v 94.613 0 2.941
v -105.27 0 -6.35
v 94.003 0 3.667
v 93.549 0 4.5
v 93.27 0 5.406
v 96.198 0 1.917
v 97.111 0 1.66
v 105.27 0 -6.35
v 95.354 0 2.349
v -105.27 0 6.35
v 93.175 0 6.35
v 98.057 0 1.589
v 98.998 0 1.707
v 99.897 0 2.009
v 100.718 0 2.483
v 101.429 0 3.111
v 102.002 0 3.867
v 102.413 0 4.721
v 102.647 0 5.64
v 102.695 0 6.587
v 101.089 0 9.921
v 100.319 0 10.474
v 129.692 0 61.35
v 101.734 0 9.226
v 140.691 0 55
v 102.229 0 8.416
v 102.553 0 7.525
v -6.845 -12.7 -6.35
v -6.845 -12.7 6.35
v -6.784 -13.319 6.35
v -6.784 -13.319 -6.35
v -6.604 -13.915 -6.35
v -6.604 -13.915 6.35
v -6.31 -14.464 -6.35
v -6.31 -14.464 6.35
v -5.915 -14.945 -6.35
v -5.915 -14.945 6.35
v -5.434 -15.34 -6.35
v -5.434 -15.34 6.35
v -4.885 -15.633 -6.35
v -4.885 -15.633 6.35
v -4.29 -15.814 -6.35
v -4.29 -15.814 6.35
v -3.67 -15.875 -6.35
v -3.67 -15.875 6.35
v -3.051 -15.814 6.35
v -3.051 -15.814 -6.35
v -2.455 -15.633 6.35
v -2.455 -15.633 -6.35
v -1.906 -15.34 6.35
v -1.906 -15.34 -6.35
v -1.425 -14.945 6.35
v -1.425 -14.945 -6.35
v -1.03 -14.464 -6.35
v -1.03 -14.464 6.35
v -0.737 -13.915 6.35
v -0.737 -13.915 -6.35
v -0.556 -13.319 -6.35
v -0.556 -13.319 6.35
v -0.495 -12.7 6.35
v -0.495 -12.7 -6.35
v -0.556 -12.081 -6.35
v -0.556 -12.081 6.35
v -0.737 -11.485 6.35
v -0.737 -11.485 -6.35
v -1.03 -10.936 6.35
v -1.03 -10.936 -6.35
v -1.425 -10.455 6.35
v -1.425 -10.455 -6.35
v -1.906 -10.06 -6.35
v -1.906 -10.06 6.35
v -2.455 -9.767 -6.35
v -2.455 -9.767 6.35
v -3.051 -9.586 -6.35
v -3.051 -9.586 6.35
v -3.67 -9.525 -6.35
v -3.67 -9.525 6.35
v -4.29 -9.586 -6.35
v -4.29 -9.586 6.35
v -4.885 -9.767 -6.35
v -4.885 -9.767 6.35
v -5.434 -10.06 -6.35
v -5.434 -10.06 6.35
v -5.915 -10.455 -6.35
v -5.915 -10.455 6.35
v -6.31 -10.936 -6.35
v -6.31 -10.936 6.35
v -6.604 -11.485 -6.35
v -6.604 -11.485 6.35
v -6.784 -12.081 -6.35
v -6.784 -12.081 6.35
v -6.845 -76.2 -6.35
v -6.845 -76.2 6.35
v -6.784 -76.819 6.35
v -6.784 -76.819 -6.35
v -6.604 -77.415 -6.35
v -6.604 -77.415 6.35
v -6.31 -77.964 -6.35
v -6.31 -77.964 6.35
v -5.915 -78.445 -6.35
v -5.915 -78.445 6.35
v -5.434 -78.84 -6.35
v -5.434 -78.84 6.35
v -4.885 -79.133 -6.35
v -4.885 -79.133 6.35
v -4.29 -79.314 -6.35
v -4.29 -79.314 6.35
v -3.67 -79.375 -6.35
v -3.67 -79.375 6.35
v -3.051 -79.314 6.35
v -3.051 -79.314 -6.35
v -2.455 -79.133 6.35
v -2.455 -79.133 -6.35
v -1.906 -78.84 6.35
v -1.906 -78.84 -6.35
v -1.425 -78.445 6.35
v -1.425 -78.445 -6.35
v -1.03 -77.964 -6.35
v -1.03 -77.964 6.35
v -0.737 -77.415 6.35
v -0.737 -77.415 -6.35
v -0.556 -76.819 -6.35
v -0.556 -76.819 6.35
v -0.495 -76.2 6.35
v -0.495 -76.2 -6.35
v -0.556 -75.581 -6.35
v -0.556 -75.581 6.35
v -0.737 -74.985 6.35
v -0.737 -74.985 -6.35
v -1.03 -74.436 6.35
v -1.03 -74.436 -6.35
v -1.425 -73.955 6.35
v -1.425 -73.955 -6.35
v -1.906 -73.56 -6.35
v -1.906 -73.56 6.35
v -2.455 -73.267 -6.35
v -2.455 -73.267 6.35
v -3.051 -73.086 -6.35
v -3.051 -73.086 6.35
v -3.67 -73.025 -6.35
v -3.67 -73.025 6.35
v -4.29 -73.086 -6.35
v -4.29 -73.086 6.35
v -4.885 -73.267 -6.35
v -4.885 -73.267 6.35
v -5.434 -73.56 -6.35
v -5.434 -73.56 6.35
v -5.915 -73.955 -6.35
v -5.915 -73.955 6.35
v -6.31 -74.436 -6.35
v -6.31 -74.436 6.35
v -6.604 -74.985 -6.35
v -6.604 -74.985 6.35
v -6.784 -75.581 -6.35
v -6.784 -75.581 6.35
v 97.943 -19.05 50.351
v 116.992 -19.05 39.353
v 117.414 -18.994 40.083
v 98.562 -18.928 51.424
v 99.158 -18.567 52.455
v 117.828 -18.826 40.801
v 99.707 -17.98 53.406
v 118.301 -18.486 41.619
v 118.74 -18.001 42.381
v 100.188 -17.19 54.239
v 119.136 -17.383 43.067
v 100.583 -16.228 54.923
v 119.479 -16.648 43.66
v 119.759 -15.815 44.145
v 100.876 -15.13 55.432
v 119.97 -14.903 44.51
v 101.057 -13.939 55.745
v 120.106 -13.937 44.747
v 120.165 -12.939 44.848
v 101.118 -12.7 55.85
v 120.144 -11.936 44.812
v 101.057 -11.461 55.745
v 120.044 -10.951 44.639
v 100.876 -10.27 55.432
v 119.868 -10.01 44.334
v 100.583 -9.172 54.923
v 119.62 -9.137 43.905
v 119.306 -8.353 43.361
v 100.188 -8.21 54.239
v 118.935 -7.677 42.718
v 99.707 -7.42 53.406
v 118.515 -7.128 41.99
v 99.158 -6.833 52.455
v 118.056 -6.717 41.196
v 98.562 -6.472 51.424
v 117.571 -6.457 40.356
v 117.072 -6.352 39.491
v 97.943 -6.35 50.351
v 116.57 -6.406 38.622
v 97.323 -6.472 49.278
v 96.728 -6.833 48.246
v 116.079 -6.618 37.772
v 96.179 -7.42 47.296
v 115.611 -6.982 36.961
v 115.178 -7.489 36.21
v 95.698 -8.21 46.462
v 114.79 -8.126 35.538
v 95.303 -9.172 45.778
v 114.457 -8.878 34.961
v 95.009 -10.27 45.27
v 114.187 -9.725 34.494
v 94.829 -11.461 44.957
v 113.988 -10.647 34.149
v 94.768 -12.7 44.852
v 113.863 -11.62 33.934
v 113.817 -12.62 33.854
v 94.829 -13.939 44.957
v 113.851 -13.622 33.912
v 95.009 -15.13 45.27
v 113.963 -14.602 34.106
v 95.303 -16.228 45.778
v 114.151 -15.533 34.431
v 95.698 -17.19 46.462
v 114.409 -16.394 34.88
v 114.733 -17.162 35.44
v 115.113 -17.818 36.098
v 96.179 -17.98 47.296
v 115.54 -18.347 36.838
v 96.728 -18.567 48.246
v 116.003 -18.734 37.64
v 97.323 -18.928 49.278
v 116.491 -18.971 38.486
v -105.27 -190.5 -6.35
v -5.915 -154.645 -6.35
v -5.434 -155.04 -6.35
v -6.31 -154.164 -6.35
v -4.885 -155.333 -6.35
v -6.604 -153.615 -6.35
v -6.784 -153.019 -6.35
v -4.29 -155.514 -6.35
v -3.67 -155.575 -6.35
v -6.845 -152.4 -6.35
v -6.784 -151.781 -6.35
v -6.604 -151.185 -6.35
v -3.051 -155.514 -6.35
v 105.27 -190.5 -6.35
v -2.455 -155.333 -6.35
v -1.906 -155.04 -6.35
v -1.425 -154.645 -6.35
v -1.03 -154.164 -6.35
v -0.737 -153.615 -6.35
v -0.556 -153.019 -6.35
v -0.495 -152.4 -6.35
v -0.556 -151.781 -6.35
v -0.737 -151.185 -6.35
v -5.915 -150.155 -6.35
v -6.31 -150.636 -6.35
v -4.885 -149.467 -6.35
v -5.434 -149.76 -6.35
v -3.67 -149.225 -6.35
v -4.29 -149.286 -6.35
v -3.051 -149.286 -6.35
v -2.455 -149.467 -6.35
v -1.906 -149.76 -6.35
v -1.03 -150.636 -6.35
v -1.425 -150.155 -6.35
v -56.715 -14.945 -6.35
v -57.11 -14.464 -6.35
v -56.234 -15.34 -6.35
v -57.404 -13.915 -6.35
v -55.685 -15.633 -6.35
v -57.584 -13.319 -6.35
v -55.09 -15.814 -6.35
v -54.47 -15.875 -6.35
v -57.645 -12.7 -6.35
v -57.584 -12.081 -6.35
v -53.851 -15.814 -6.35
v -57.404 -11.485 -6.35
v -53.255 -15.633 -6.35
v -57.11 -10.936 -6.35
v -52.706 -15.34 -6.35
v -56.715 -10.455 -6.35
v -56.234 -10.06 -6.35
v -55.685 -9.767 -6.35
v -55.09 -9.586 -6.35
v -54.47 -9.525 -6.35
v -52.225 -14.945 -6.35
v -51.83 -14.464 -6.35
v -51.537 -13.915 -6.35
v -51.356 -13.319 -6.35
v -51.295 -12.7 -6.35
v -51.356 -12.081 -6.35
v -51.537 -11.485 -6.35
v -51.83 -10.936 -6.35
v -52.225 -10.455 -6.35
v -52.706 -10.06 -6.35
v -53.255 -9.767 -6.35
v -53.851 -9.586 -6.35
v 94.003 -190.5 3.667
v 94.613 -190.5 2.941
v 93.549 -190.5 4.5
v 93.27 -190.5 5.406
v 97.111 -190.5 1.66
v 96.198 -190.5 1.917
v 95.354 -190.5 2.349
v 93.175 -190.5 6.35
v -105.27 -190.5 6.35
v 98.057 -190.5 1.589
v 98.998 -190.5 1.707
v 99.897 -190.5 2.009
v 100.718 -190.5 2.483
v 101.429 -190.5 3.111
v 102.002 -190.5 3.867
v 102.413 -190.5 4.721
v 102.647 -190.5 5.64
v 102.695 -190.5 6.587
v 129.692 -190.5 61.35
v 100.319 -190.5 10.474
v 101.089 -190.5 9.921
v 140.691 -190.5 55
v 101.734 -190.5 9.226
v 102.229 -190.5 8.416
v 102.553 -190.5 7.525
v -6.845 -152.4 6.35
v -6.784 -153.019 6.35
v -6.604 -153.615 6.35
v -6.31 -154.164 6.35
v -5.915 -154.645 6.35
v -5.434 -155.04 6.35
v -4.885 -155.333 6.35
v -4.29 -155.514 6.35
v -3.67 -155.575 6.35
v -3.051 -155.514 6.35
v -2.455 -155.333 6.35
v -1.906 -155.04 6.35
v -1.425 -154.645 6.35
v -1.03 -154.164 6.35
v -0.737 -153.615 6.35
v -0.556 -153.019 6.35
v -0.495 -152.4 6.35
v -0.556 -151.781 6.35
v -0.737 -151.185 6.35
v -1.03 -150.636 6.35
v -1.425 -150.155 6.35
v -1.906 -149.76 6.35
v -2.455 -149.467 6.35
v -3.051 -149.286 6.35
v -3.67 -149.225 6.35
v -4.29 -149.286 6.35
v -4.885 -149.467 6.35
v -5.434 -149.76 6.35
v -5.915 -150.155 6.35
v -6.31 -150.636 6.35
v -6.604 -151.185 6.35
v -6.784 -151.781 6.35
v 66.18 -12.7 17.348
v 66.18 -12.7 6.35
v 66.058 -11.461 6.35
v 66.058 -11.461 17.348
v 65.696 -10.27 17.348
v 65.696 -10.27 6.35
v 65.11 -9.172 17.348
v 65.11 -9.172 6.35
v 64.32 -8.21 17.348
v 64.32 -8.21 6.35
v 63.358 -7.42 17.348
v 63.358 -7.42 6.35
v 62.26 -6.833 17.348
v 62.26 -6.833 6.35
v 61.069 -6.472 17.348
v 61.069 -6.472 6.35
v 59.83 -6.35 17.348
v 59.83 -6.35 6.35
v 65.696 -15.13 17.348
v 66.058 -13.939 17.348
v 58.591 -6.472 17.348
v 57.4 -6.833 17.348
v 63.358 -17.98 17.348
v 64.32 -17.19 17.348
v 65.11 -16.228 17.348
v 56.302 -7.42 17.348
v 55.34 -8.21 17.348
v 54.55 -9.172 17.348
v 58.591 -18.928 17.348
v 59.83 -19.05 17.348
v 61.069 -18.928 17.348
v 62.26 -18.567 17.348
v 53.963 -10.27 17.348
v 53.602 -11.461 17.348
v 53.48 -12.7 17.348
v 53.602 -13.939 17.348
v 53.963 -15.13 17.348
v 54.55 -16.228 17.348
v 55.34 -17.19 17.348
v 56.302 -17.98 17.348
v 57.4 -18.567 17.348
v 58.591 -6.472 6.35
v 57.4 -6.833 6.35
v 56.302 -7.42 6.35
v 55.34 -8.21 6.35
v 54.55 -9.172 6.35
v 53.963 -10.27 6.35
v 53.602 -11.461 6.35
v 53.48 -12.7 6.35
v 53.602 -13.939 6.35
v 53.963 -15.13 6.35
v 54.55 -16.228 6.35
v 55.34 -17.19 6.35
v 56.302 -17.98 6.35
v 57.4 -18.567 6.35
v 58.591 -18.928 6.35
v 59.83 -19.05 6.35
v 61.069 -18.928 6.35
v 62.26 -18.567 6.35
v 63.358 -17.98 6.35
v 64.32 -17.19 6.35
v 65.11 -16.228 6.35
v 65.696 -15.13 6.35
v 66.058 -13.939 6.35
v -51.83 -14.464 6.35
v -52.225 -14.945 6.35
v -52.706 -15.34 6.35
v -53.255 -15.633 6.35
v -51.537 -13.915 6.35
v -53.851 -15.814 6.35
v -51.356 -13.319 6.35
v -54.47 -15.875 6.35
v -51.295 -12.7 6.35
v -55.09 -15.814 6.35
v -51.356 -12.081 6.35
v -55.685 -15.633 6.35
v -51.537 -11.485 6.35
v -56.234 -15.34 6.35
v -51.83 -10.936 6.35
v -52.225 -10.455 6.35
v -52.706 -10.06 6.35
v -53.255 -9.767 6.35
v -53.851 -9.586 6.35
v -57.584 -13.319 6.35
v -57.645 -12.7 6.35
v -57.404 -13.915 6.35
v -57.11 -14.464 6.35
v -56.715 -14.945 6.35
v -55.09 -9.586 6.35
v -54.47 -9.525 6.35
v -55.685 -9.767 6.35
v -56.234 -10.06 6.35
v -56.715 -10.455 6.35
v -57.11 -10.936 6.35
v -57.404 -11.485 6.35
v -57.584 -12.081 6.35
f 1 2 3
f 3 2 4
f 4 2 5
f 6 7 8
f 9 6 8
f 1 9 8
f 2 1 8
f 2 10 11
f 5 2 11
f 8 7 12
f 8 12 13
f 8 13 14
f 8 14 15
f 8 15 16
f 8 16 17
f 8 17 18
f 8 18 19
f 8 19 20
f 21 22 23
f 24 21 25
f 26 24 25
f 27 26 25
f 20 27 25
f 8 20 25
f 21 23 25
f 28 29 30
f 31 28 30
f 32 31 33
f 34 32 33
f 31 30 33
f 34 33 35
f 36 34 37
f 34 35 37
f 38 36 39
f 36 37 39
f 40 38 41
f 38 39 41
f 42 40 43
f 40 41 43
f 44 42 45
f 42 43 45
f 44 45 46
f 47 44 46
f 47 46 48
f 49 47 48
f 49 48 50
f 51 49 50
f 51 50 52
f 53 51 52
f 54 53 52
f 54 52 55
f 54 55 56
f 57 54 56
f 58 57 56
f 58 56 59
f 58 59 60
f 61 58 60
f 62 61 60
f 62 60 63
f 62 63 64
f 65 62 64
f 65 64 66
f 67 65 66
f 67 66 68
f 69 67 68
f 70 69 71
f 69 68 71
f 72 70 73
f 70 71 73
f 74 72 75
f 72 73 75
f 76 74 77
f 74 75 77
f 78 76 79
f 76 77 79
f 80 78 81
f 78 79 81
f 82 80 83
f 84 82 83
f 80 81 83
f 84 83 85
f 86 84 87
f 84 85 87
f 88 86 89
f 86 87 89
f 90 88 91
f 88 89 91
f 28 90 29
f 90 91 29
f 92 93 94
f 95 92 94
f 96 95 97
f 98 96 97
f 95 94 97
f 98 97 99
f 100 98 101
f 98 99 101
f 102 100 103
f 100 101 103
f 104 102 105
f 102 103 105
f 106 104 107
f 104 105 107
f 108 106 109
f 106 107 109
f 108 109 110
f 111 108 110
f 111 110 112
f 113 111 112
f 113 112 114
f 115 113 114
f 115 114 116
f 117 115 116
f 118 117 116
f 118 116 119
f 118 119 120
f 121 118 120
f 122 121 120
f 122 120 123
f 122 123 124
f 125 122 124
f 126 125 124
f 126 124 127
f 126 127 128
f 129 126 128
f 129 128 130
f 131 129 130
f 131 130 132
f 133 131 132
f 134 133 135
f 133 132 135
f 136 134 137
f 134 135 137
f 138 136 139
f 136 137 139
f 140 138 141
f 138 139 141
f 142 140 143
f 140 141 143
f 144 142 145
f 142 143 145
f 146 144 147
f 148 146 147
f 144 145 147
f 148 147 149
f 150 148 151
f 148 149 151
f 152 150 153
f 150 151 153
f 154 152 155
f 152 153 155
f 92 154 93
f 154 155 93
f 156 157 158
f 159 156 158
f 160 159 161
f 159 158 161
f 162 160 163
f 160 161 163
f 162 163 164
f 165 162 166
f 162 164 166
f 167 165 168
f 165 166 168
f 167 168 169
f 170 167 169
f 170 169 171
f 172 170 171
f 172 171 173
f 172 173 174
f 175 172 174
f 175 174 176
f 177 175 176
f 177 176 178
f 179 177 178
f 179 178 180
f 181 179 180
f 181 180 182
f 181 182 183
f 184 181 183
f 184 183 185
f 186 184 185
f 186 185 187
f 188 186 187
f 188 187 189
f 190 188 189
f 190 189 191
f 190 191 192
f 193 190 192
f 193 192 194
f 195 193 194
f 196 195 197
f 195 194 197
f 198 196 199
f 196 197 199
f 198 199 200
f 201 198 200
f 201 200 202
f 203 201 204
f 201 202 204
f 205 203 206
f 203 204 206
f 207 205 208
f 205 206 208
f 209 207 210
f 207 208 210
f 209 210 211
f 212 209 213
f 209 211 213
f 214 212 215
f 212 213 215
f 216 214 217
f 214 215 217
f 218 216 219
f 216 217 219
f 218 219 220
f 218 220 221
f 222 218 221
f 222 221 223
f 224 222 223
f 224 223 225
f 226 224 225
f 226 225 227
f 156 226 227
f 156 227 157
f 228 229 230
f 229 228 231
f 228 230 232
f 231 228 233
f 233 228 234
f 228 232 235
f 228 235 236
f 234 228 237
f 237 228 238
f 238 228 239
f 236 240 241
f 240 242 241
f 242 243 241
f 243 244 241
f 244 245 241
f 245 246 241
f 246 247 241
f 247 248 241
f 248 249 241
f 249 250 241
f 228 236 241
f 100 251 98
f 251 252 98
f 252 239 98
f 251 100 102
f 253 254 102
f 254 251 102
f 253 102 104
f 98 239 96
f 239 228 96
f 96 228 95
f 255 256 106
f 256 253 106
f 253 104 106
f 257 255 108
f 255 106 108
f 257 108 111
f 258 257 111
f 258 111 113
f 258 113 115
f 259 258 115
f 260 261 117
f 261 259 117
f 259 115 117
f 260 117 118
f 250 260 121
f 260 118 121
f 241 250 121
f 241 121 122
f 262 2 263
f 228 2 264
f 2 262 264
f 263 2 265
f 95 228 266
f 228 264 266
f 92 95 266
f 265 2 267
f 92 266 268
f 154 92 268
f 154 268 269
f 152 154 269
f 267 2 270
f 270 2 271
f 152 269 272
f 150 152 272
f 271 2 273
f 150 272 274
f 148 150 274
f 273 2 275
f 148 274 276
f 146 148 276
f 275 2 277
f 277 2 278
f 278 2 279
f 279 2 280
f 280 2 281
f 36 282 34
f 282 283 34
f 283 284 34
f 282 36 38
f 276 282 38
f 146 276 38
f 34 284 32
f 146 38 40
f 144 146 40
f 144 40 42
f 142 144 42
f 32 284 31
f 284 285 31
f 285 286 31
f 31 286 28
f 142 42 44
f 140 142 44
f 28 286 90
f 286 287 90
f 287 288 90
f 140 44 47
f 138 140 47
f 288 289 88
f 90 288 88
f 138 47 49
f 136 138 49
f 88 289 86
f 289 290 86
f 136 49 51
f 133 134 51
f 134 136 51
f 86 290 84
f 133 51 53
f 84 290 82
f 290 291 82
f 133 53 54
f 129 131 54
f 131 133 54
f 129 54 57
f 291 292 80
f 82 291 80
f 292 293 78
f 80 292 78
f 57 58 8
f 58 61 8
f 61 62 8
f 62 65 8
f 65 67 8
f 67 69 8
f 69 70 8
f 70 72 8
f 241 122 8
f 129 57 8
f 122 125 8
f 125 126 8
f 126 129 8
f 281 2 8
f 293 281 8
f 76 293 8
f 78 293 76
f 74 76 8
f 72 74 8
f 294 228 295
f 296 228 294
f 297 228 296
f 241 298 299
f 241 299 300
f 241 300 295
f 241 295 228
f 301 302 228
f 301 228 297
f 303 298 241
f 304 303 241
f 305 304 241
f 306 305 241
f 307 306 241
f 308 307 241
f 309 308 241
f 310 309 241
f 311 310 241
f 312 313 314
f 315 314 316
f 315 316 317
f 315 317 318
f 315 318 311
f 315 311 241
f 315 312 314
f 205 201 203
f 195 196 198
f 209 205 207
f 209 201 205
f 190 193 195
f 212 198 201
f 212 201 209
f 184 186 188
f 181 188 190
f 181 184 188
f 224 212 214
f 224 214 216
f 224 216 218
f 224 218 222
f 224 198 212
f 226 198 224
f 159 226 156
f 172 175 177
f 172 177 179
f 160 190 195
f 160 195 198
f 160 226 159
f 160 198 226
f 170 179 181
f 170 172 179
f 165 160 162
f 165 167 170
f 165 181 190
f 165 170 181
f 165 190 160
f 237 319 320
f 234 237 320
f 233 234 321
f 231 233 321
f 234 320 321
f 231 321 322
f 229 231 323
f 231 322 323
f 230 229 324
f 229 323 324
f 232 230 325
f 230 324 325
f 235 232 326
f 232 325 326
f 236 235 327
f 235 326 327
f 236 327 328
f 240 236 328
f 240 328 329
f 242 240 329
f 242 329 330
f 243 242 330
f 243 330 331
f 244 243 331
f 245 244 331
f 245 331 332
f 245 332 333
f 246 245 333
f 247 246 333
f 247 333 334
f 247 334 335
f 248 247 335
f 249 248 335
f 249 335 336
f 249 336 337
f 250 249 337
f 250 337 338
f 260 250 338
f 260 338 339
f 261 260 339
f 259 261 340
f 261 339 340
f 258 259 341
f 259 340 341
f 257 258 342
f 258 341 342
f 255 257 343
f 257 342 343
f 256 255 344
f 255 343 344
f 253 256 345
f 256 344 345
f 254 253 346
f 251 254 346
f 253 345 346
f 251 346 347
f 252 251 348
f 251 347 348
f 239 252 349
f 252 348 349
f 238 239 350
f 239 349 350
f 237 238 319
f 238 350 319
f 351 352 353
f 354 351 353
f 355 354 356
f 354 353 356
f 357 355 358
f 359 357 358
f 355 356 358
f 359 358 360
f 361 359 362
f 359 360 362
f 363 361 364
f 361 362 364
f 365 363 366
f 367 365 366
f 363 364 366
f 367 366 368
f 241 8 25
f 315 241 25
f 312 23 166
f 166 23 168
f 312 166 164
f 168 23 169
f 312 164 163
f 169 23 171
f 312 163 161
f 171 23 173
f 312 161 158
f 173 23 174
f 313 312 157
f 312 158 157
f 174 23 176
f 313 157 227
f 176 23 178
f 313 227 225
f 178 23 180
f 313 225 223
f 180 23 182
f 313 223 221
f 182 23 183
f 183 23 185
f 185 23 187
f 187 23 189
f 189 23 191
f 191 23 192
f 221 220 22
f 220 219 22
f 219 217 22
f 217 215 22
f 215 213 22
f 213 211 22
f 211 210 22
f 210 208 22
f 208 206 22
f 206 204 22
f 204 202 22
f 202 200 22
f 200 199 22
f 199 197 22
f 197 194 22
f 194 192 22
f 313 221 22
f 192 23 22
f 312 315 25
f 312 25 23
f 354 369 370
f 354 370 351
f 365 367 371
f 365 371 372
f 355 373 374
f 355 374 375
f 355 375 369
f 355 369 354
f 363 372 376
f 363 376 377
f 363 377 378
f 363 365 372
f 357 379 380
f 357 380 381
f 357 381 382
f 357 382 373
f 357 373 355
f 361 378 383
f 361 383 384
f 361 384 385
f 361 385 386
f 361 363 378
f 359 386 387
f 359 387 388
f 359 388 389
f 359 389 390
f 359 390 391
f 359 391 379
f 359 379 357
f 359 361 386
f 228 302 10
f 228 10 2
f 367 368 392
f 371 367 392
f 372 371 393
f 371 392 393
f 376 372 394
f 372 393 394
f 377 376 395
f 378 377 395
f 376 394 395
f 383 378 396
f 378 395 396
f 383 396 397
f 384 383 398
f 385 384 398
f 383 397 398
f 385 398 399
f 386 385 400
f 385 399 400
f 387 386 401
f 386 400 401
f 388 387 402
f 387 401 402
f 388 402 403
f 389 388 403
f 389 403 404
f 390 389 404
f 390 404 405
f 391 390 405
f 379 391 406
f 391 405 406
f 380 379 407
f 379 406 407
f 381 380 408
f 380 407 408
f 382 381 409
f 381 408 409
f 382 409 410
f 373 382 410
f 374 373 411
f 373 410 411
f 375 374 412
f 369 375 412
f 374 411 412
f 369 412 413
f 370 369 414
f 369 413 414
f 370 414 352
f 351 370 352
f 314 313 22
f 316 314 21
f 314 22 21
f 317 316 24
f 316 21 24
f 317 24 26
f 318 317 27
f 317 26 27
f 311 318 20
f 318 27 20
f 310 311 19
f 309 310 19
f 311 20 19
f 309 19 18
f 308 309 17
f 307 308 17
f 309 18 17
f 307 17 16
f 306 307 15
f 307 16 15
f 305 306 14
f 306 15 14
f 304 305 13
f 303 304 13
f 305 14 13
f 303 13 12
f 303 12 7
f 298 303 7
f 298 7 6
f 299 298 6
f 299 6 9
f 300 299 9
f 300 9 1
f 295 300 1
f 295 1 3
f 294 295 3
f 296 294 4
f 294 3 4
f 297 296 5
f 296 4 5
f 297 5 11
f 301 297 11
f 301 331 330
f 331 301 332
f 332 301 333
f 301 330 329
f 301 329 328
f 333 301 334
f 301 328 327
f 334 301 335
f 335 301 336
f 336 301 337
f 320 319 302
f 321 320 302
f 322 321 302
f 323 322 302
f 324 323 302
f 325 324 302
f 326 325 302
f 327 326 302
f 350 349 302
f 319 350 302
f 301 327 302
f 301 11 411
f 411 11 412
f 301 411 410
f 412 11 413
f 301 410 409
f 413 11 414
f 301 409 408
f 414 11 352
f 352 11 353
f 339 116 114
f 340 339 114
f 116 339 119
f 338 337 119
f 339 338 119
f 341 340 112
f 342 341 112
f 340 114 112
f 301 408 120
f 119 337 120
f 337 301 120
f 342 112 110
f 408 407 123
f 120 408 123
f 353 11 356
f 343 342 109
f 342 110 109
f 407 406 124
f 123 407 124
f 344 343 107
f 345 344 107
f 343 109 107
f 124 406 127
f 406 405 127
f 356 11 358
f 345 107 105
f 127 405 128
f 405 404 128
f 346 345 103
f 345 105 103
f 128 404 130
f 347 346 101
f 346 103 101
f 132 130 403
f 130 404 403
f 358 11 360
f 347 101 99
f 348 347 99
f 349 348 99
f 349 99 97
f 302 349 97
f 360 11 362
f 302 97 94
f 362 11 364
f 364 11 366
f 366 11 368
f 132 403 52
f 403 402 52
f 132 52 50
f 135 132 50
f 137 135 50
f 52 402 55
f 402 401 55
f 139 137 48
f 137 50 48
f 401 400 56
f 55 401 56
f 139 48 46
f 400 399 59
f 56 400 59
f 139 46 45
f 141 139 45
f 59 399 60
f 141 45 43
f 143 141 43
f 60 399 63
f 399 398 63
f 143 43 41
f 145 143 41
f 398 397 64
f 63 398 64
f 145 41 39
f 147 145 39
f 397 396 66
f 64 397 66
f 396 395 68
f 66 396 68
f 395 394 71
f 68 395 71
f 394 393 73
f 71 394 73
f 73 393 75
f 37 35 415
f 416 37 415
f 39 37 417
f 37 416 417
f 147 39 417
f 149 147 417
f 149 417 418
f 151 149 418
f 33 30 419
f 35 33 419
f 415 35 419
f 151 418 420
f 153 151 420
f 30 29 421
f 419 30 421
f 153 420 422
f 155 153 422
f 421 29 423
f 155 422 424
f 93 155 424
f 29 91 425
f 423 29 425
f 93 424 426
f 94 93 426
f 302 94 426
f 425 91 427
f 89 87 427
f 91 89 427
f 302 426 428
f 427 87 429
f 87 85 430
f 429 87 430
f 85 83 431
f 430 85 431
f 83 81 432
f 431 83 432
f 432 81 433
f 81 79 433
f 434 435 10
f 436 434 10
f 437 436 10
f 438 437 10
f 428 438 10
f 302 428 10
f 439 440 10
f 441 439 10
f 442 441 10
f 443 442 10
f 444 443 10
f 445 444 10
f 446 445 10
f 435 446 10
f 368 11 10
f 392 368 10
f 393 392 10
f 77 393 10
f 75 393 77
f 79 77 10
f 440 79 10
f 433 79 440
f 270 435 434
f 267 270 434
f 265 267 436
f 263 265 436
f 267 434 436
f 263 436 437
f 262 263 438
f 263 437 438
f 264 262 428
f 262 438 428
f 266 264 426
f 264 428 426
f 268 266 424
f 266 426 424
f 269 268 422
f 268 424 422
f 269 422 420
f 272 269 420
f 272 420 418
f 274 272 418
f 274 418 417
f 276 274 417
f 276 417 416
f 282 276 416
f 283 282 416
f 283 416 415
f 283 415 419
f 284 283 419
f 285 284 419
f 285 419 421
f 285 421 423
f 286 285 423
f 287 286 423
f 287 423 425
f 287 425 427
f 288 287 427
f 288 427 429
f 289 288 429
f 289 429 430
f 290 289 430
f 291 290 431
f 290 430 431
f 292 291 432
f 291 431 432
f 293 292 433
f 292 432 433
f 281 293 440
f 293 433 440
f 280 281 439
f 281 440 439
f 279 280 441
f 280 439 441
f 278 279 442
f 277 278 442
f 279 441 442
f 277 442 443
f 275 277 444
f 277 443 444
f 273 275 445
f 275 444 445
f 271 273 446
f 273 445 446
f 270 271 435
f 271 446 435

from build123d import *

# Parameters (mm, degrees)
F1_DEPTH = 190.5
F3_D     = 6.35
F5_DEPTH = 10.9982
F7_DEPTH = 21.9964


with BuildPart() as f1:
    # F0 (on Front) → F1 (new body)
    with BuildSketch(Plane.XZ):
        with BuildLine():
            ThreePointArc((100.319202, 10.474446), (100.319202, 2.225554), (93.175452, 6.35))
            Line((93.175452, 6.35), (-93.175452, 6.35))
            Line((-93.175452, 6.35), (-105.2703, 6.35))
            Line((-105.2703, 6.35), (-105.2703, -6.35))
            Line((-105.2703, -6.35), (105.2703, -6.35))
            Line((105.2703, -6.35), (140.6906, 54.999759))
            Line((140.6906, 54.999759), (129.692077, 61.349759))
            Line((129.692077, 61.349759), (100.319202, 10.474446))
        make_face()
    extrude(amount=F1_DEPTH)

    # F3 (through all)
    with Locations(Plane(origin=(0, 0, -6.35), x_dir=(1, 0, 0), z_dir=(0, 0, -1))):
        with Locations((-3.6703, 152.4), (-3.6703, 76.2), (-3.6703, 12.7), (-54.4703, 12.7)):
            Hole(F3_D / 2)

    # F4 (on face) → F5 (join)
    with BuildSketch(Plane.XY.offset(6.35)):
        with BuildLine():
            ThreePointArc((59.8297, -6.35), (55.339572, -17.190128), (66.1797, -12.7))
            ThreePointArc((66.1797, -12.7), (64.319828, -8.209872), (59.8297, -6.35))
        make_face()
    extrude(amount=F5_DEPTH)

    # F6 (on face) → F7 (join)
    with BuildSketch(Plane(origin=(70.703833, 0, -40.820877), x_dir=(0, -1, 0), z_dir=(-0.866025, 0, 0.5))):
        with BuildLine():
            ThreePointArc((6.35, 92.576489), (12.7, 86.226489), (19.05, 92.576489))
            ThreePointArc((19.05, 92.576489), (12.7, 98.926489), (6.35, 92.576489))
        make_face()
    extrude(amount=F7_DEPTH)


solid = f1.part
